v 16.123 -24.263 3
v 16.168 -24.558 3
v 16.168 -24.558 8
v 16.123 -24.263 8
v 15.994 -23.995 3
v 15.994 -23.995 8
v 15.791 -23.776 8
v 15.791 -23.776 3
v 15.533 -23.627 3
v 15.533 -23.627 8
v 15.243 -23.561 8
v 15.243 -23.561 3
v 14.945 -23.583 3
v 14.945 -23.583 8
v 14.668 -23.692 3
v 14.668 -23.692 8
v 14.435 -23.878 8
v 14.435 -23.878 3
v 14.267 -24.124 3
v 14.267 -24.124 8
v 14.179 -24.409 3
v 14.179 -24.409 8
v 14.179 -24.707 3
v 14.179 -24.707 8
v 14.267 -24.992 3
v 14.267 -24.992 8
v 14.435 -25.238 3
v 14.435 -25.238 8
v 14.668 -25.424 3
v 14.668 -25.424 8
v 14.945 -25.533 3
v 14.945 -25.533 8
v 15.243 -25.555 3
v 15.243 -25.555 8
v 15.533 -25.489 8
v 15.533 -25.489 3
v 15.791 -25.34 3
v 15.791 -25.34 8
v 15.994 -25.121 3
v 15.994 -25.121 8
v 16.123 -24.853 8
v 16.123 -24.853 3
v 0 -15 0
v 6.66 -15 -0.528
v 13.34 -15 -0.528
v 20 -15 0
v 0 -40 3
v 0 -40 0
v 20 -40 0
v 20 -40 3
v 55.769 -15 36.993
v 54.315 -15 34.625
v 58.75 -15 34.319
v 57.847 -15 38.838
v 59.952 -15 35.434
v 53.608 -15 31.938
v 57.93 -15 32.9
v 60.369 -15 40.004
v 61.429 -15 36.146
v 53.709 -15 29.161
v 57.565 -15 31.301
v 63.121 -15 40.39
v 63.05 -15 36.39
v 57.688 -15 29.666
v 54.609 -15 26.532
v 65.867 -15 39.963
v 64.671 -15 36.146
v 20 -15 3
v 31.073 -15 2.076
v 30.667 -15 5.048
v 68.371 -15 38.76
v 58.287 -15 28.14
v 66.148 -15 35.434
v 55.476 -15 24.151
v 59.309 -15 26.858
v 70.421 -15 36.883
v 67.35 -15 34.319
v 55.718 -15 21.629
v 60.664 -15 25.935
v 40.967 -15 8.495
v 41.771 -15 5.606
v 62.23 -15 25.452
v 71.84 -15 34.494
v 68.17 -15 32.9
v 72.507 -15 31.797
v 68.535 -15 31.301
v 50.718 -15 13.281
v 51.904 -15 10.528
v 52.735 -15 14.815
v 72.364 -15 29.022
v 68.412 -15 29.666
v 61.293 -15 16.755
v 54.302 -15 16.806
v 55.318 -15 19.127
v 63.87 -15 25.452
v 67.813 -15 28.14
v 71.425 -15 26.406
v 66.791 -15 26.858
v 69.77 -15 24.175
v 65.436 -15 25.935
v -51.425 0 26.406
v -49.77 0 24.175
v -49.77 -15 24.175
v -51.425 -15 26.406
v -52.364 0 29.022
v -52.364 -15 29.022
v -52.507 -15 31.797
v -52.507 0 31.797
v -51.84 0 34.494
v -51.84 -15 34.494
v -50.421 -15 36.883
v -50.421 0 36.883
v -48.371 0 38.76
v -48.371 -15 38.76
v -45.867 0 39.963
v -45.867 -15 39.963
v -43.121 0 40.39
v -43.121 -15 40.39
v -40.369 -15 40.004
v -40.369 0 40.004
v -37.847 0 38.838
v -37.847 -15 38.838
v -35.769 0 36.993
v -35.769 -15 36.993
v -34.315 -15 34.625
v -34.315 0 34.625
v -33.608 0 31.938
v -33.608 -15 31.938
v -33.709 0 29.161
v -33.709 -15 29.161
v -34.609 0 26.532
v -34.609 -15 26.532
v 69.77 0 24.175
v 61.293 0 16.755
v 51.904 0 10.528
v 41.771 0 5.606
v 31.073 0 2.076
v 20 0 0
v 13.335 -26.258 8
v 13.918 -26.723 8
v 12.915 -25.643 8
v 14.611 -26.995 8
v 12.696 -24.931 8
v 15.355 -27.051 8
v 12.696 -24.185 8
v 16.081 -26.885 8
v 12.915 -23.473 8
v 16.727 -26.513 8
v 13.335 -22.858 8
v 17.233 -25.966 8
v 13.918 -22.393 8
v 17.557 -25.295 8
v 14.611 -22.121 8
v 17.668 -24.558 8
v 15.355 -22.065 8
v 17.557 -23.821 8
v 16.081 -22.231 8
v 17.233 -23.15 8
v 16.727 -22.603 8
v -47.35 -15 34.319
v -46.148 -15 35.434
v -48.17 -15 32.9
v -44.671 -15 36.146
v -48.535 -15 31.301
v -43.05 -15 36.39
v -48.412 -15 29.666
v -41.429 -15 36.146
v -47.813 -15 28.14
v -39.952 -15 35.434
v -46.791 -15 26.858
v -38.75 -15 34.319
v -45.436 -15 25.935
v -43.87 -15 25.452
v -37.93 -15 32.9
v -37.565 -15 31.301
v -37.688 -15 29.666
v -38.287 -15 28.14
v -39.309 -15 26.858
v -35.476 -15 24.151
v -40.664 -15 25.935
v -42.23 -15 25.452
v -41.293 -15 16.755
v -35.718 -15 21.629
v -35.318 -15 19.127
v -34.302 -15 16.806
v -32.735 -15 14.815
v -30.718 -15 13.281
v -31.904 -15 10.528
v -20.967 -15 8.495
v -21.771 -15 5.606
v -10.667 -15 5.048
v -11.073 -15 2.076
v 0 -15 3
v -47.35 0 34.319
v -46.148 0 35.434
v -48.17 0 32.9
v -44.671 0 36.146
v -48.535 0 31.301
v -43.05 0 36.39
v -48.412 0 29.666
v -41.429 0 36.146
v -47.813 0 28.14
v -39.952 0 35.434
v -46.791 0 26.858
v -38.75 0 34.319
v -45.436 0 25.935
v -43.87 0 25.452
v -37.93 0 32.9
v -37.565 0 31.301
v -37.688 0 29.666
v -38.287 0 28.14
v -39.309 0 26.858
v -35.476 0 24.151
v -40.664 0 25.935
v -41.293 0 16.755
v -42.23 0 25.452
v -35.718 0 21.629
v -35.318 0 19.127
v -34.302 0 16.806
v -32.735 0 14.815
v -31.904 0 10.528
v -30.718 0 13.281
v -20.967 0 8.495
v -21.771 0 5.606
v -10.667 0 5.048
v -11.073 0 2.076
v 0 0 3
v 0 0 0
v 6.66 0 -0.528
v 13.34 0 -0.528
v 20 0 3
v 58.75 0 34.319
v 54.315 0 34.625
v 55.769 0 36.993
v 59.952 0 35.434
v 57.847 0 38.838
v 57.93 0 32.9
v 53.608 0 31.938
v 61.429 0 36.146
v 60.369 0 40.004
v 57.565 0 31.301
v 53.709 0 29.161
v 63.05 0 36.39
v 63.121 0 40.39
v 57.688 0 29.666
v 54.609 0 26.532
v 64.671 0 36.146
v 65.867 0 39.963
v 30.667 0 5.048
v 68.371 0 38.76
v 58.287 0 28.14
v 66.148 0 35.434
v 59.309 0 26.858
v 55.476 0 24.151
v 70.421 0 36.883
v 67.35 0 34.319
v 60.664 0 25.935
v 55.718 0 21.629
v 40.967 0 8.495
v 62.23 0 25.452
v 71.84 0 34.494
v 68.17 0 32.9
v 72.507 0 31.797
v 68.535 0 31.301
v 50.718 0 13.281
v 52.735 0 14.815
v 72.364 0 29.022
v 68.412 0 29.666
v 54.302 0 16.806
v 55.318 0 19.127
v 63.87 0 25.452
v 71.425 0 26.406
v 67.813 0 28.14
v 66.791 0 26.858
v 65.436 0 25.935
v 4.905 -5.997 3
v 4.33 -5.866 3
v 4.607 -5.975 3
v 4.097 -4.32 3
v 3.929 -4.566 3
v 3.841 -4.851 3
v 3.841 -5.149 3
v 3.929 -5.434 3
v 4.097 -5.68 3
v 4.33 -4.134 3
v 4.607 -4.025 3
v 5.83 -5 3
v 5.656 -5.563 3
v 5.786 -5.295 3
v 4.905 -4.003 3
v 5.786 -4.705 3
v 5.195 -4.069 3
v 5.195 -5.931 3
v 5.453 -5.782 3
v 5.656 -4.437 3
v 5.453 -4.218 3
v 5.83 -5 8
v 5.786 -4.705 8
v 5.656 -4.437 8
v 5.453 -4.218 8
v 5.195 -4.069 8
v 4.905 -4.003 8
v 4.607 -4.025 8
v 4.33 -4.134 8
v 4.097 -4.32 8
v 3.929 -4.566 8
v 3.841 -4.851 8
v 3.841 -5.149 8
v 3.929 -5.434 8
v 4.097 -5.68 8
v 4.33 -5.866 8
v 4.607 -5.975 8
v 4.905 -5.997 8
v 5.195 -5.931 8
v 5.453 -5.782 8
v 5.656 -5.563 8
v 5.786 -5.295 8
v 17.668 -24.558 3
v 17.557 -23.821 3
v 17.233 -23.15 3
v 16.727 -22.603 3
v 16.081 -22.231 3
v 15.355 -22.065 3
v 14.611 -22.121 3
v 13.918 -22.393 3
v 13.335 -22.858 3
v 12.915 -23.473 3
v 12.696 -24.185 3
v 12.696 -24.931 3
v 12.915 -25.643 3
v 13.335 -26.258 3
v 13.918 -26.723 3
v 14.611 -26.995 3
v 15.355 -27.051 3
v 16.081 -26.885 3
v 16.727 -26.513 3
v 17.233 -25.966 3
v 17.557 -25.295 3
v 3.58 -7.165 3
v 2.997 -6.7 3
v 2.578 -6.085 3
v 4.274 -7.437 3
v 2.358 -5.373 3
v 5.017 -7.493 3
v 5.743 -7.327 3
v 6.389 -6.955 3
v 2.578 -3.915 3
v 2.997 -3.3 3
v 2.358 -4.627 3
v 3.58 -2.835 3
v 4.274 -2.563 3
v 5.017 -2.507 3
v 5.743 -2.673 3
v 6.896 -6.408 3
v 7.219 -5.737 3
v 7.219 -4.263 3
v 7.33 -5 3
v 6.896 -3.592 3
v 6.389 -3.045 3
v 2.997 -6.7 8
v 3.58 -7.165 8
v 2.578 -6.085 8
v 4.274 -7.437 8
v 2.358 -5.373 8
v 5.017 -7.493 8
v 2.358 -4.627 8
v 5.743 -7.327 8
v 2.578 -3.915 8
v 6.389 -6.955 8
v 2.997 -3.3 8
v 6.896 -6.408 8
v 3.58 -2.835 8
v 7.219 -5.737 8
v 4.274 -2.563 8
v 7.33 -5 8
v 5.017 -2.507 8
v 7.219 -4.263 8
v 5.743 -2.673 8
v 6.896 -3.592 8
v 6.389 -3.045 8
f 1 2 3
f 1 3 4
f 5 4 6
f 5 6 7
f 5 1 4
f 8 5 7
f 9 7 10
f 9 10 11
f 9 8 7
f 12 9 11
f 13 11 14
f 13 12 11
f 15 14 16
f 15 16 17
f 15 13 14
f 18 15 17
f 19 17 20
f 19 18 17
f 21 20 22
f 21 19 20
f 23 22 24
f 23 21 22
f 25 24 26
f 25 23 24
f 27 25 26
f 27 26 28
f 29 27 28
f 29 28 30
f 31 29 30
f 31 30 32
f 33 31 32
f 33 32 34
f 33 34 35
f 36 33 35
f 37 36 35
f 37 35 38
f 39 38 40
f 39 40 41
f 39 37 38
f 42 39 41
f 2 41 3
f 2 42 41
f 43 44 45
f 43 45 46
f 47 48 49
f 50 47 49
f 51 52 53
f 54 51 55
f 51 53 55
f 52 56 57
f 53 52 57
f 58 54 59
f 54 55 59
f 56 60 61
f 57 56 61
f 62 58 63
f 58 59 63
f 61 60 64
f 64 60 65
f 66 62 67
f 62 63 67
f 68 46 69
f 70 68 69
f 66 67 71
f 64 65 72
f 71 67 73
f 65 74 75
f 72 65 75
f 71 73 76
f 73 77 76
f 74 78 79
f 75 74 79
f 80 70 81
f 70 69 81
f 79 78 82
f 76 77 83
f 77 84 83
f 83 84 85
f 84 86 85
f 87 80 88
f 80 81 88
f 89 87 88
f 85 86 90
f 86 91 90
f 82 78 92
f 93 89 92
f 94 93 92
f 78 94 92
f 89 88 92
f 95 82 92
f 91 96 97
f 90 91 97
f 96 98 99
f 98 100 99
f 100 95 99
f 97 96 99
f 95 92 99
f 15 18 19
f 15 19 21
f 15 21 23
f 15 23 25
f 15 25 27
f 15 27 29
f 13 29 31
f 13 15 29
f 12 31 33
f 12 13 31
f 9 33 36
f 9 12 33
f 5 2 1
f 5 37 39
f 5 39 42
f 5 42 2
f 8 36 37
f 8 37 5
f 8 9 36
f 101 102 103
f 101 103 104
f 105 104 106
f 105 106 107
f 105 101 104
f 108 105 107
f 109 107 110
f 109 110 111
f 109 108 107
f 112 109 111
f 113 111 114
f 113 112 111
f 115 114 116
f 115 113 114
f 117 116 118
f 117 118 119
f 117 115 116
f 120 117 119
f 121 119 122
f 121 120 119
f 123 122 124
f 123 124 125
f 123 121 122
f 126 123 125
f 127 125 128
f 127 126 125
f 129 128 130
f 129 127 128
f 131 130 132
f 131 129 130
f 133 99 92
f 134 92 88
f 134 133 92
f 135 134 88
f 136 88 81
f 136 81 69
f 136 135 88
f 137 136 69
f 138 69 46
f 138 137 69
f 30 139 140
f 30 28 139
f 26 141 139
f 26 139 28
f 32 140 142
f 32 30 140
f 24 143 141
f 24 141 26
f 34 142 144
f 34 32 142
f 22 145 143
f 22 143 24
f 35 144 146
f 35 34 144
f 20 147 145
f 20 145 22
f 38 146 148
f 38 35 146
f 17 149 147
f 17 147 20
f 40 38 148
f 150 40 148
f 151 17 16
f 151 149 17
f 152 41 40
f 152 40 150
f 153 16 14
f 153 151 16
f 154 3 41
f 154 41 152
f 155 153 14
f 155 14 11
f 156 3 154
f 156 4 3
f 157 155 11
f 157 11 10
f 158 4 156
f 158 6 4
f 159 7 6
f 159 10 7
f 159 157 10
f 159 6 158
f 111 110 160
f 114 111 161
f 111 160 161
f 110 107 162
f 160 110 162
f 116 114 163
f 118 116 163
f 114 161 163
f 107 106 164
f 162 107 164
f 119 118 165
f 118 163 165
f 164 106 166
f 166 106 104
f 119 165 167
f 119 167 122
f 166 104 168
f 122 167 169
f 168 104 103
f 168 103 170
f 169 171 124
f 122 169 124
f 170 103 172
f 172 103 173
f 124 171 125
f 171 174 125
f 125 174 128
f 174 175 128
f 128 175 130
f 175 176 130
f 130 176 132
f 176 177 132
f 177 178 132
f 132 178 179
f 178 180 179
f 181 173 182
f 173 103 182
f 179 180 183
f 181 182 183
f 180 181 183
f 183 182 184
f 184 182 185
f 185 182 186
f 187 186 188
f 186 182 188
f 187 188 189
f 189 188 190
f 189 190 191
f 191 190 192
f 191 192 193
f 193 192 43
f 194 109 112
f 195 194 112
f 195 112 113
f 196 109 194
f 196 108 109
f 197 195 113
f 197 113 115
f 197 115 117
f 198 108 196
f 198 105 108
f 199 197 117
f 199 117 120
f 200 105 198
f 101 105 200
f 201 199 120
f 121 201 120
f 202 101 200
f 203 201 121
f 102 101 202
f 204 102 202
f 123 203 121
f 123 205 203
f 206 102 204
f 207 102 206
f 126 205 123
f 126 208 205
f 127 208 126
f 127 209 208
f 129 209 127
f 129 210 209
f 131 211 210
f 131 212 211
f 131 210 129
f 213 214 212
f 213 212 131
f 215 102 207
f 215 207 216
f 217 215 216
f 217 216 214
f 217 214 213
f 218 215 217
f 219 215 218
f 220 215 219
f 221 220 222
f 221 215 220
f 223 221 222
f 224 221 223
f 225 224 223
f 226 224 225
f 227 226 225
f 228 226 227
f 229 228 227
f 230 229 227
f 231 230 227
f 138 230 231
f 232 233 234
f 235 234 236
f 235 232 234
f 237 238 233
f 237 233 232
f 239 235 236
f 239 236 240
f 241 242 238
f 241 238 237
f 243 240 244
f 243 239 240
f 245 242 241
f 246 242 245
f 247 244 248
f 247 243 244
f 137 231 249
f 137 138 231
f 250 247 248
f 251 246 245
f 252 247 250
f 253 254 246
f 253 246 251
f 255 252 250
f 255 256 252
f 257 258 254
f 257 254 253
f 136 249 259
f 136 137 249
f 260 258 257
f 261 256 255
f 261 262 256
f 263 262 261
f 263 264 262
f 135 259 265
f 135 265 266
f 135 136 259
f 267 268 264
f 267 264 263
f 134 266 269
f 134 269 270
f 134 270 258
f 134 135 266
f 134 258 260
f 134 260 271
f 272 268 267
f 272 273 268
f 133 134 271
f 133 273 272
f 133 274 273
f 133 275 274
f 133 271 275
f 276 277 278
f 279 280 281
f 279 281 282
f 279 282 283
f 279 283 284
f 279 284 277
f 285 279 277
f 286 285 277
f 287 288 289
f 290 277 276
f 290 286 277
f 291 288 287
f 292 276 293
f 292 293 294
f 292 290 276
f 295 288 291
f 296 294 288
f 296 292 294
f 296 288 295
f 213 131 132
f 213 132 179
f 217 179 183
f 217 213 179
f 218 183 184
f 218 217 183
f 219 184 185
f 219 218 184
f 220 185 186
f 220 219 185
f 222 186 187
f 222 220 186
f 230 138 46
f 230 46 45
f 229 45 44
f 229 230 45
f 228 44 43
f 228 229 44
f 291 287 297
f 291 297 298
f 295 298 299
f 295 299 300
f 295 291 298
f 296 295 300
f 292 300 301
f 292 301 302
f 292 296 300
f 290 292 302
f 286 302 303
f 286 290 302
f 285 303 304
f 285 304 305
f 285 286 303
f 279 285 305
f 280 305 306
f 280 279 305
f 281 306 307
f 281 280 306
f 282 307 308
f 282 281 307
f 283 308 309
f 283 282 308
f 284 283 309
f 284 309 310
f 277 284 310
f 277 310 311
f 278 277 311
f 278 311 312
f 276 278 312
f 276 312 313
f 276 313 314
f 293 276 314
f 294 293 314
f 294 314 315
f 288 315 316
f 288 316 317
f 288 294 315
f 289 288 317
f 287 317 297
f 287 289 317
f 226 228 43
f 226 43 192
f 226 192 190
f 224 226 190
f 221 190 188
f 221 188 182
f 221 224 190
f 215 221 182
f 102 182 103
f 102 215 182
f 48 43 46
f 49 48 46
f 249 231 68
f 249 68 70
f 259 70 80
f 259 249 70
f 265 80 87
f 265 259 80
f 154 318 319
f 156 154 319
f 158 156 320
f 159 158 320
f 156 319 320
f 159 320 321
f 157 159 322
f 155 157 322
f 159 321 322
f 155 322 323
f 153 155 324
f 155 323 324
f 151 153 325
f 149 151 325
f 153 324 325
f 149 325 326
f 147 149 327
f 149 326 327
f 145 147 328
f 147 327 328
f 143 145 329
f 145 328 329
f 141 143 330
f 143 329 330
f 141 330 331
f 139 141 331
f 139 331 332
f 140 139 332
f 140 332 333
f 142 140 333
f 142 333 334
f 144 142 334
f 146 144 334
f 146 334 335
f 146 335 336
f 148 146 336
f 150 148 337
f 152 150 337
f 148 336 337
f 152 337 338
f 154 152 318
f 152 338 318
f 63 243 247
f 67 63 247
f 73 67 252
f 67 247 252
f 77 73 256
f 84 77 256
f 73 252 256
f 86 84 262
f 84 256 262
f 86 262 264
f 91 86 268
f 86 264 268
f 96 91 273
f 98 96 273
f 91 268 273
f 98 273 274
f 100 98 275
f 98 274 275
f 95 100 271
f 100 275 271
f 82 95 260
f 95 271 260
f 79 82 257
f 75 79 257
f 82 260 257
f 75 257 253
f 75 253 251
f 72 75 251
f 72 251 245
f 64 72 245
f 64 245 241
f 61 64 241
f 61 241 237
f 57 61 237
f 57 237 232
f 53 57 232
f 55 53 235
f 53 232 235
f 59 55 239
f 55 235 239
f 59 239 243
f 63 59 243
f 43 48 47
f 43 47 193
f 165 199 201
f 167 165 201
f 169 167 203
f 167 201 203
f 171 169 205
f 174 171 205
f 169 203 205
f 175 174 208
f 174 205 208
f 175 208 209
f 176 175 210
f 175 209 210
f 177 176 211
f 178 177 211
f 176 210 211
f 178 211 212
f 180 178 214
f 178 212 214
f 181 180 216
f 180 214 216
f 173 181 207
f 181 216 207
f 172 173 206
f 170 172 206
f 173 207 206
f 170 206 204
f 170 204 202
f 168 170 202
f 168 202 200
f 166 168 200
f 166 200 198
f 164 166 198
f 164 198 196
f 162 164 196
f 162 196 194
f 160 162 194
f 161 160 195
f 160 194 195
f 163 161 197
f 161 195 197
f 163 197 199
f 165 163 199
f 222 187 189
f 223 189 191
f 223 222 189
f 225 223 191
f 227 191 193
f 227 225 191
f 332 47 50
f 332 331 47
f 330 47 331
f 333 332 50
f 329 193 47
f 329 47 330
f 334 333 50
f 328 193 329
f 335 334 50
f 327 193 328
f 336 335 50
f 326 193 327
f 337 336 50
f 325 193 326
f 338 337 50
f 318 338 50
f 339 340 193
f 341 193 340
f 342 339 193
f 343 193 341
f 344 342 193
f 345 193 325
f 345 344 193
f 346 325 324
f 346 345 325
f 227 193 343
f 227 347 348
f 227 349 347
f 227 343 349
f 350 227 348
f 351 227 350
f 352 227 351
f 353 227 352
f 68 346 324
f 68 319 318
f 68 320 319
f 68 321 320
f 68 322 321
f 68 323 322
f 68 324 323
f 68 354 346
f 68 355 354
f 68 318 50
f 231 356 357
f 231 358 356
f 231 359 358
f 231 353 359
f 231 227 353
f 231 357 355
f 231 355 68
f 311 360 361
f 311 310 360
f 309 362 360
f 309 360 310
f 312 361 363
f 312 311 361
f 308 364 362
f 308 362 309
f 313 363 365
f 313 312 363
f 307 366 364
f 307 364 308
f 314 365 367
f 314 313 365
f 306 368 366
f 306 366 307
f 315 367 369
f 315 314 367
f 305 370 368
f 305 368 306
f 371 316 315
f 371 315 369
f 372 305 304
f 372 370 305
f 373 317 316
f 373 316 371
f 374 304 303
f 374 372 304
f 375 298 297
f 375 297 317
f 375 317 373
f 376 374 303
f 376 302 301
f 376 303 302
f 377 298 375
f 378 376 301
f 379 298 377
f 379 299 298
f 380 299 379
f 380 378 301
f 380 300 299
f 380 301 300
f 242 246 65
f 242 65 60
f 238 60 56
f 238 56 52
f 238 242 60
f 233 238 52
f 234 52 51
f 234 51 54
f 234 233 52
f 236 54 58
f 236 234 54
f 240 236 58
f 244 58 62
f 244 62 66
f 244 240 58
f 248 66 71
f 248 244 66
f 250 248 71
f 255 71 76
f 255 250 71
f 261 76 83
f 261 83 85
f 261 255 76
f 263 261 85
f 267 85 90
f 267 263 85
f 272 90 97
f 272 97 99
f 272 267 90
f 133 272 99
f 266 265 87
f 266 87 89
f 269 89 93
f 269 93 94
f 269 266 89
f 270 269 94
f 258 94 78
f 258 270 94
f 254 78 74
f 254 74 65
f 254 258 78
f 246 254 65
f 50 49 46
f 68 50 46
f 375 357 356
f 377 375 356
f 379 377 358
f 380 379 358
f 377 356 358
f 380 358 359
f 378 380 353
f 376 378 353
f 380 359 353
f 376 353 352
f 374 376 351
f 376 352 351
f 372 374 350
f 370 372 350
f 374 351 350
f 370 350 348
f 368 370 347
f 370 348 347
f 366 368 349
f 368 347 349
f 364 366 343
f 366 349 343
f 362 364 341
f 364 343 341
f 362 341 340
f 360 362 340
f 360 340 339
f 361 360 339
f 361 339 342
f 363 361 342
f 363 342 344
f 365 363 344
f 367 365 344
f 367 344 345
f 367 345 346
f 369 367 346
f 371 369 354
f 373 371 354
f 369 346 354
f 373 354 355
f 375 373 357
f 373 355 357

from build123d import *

# Parameters (mm, degrees)
SKETCH1_W           = 20
SKETCH1_H           = 40
BOSS_EXTRUDE1_DEPTH = 3
SKETCH2_R           = 2.5
SKETCH2_R_2         = 1
BOSS_EXTRUDE2_DEPTH = 5
SKETCH3_R           = 5.5
BOSS_EXTRUDE3_DEPTH = 15


with BuildPart() as part:
    # Sketch1 → Boss-Extrude1 (new body)
    with BuildSketch(Plane.XY):
        with Locations((10, -20)):
            Rectangle(SKETCH1_W, SKETCH1_H)
    extrude(amount=BOSS_EXTRUDE1_DEPTH)

    # Sketch2 → Boss-Extrude2 (add)
    # profile 1 of 2: a face of its own
    with BuildSketch(Plane.XY.offset(3)):
        with Locations((4.83, -5)):
            Circle(SKETCH2_R)
        with Locations((4.83, -5)):
            Circle(SKETCH2_R_2, mode=Mode.SUBTRACT)
    # profile 2 of 2: a face of its own
    with BuildSketch(Plane.XY.offset(3)):
        with Locations((15.1678, -24.558)):
            Circle(SKETCH2_R)
        with Locations((15.1678, -24.558)):
            Circle(SKETCH2_R_2, mode=Mode.SUBTRACT)
    extrude(amount=BOSS_EXTRUDE2_DEPTH)

    # Sketch3 → Boss-Extrude3 (add)
    # profile 1 of 3: a face of its own
    with BuildSketch(Plane(origin=(0, 0, 0), x_dir=(1, 0, 0), z_dir=(0, 1, 0))):
        with BuildLine():
            Line((0, -3), (0, 0))
            ThreePointArc((0, 0), (-26.919603607, -7.898350205), (-49.769666667, -24.174824407))
            ThreePointArc((-49.769666667, -24.174824407), (-44.509522467, -40.277400292), (-34.608629413, -26.532059851))
            ThreePointArc((-34.608629413, -26.532059851), (-35.317872875, -19.127120719), (-30.717669917, -13.28124332))
            ThreePointArc((-30.717669917, -13.28124332), (-15.874630461, -6.599559407), (0, -3))
        make_face()
        with Locations(Location((-43.05, -30.890185893, 0), (0, 0, 270))):
            Circle(SKETCH3_R, mode=Mode.SUBTRACT)
    # profile 2 of 3: a face of its own
    with BuildSketch(Plane(origin=(0, 0, 0), x_dir=(1, 0, 0), z_dir=(0, 1, 0))):
        with BuildLine():
            ThreePointArc((69.769666667, -24.174824407), (46.919603607, -7.898350205), (20, 0))
            Line((20, 0), (20, -3))
            ThreePointArc((20, -3), (35.874630461, -6.599559407), (50.717669917, -13.28124332))
            ThreePointArc((50.717669917, -13.28124332), (55.317872875, -19.127120719), (54.608629413, -26.532059851))
            ThreePointArc((54.608629413, -26.532059851), (64.509522467, -40.277400292), (69.769666667, -24.174824407))
        make_face()
        with Locations(Location((63.05, -30.890185893, 0), (0, 0, 270))):
            Circle(SKETCH3_R, mode=Mode.SUBTRACT)
    # profile 3 of 3: a face of its own
    with BuildSketch(Plane(origin=(0, 0, 0), x_dir=(1, 0, 0), z_dir=(0, 1, 0))):
        with BuildLine():
            Line((0, 0), (20, 0))
            ThreePointArc((20, 0), (10, 0.593802374), (0, 0))
        make_face()
    extrude(amount=-BOSS_EXTRUDE3_DEPTH)


solid = part.part
